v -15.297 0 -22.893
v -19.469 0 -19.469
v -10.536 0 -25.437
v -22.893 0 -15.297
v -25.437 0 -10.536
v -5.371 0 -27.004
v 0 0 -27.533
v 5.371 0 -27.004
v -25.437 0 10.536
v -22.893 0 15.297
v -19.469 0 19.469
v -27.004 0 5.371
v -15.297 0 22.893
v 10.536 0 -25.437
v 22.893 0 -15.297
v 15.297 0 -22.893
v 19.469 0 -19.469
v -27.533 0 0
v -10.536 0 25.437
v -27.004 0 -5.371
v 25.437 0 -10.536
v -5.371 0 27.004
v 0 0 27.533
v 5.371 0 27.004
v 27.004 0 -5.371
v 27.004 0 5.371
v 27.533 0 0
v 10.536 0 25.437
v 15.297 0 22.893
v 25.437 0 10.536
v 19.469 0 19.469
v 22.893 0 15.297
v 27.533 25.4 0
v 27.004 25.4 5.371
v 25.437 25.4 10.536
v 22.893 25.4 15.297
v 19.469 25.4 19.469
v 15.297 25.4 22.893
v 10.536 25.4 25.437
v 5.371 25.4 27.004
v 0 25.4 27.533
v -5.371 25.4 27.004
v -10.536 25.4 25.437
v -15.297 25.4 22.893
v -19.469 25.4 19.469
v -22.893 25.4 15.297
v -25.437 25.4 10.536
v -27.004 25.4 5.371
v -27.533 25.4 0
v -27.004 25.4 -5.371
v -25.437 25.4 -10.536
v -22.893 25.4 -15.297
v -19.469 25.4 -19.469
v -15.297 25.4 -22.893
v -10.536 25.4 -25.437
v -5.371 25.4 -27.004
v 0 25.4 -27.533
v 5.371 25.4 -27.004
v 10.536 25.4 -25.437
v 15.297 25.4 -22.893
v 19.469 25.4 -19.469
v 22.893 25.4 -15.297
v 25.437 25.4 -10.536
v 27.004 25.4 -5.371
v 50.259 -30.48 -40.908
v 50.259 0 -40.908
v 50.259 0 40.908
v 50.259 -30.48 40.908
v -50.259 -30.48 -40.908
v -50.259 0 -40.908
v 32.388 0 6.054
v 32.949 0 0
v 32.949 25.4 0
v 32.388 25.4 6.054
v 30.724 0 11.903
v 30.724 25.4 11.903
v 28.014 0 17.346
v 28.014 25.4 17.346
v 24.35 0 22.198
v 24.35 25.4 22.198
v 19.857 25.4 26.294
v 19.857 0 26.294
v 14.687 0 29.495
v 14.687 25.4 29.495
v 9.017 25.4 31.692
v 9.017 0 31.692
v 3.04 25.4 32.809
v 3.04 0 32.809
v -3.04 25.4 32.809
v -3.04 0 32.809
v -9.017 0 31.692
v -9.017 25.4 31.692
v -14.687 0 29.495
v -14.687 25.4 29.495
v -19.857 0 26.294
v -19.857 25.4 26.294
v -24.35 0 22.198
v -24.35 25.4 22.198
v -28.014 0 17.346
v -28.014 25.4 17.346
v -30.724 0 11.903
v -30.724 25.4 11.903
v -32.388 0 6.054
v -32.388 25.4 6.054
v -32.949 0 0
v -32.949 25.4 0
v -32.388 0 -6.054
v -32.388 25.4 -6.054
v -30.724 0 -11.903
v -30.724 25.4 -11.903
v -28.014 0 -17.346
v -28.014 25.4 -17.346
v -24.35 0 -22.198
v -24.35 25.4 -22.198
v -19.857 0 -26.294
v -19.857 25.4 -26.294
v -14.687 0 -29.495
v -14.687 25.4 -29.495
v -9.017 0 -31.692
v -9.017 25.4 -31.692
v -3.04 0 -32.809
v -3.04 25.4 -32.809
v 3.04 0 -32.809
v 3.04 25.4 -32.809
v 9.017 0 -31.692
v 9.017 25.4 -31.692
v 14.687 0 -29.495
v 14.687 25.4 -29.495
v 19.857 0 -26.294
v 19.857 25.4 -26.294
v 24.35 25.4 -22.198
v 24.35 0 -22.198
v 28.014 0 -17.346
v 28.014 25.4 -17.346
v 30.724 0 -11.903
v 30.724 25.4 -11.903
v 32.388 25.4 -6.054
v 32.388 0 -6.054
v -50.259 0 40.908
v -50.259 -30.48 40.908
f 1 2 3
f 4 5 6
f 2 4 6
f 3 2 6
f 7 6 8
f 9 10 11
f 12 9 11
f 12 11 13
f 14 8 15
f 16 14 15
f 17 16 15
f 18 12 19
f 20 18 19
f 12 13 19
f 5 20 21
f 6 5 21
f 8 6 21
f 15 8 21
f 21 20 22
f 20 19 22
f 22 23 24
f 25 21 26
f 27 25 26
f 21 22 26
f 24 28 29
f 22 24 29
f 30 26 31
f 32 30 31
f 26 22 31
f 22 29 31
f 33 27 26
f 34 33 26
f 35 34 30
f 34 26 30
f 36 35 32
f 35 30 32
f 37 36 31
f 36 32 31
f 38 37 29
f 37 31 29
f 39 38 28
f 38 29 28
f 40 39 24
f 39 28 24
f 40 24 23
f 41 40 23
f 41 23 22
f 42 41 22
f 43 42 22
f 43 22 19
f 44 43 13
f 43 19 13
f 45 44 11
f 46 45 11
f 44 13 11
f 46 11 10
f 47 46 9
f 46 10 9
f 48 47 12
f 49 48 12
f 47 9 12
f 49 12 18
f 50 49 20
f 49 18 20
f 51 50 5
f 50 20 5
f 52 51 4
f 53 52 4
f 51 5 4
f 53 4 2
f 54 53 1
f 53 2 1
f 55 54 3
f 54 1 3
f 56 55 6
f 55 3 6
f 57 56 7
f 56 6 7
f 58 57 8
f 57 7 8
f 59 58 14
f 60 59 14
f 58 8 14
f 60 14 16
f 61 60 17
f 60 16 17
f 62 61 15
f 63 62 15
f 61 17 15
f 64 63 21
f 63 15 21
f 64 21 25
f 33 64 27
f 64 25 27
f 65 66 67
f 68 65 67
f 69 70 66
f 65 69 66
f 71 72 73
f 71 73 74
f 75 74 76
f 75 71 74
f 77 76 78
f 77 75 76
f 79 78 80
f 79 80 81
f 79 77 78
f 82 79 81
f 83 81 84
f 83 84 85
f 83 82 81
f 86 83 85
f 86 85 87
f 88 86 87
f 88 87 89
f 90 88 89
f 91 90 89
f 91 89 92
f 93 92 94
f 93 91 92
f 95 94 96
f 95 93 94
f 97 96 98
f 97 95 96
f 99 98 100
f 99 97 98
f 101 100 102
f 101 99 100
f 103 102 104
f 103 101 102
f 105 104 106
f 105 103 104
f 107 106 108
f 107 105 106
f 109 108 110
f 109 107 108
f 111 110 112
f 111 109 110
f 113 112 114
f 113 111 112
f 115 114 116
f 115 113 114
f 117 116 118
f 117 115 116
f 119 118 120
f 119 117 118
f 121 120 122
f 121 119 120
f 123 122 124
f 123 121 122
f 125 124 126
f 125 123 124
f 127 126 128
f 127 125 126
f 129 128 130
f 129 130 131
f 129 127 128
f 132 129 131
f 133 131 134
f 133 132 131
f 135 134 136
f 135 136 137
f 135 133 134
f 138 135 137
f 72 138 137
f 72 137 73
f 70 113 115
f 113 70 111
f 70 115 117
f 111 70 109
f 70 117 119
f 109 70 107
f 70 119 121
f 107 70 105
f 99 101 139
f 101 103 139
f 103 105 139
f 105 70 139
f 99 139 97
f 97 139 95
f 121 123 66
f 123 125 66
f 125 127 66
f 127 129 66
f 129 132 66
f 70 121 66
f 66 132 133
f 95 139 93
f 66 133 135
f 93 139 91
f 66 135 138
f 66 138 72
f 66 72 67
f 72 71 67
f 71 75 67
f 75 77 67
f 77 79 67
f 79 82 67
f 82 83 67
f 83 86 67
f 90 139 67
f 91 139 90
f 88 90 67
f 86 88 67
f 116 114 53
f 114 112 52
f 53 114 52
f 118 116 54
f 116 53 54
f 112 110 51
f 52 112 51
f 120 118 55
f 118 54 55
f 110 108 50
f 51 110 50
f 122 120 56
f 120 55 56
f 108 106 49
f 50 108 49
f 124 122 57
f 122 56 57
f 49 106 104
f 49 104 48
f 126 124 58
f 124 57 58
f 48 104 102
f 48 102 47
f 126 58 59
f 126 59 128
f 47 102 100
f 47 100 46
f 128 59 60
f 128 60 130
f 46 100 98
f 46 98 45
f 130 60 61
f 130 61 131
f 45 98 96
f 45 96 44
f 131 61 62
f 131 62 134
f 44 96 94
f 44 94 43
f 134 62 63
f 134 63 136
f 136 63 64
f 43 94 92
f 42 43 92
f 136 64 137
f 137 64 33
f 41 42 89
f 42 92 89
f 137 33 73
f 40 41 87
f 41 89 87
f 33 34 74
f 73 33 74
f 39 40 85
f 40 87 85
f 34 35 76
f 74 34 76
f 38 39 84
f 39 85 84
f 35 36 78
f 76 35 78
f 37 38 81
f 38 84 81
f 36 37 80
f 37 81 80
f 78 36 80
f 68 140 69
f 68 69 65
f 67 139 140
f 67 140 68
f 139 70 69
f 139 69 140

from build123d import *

# Parameters (mm, degrees)
F0_W     = 100.517206
F0_H     = 81.81633
F1_DEPTH = 30.48
F2_R     = 32.949499
F2_R_2   = 27.533167
F3_DEPTH = 25.4


with BuildPart() as f1:
    # F0 (on Front) → F1 (new body)
    with BuildSketch(Plane.XZ):
        Rectangle(F0_W, F0_H)
    extrude(amount=F1_DEPTH)

    # F2 (on Front) → F3 (join)
    with BuildSketch(Plane.XZ):
        Circle(F2_R)
        Circle(F2_R_2, mode=Mode.SUBTRACT)
    extrude(amount=-F3_DEPTH)


solid = f1.part
